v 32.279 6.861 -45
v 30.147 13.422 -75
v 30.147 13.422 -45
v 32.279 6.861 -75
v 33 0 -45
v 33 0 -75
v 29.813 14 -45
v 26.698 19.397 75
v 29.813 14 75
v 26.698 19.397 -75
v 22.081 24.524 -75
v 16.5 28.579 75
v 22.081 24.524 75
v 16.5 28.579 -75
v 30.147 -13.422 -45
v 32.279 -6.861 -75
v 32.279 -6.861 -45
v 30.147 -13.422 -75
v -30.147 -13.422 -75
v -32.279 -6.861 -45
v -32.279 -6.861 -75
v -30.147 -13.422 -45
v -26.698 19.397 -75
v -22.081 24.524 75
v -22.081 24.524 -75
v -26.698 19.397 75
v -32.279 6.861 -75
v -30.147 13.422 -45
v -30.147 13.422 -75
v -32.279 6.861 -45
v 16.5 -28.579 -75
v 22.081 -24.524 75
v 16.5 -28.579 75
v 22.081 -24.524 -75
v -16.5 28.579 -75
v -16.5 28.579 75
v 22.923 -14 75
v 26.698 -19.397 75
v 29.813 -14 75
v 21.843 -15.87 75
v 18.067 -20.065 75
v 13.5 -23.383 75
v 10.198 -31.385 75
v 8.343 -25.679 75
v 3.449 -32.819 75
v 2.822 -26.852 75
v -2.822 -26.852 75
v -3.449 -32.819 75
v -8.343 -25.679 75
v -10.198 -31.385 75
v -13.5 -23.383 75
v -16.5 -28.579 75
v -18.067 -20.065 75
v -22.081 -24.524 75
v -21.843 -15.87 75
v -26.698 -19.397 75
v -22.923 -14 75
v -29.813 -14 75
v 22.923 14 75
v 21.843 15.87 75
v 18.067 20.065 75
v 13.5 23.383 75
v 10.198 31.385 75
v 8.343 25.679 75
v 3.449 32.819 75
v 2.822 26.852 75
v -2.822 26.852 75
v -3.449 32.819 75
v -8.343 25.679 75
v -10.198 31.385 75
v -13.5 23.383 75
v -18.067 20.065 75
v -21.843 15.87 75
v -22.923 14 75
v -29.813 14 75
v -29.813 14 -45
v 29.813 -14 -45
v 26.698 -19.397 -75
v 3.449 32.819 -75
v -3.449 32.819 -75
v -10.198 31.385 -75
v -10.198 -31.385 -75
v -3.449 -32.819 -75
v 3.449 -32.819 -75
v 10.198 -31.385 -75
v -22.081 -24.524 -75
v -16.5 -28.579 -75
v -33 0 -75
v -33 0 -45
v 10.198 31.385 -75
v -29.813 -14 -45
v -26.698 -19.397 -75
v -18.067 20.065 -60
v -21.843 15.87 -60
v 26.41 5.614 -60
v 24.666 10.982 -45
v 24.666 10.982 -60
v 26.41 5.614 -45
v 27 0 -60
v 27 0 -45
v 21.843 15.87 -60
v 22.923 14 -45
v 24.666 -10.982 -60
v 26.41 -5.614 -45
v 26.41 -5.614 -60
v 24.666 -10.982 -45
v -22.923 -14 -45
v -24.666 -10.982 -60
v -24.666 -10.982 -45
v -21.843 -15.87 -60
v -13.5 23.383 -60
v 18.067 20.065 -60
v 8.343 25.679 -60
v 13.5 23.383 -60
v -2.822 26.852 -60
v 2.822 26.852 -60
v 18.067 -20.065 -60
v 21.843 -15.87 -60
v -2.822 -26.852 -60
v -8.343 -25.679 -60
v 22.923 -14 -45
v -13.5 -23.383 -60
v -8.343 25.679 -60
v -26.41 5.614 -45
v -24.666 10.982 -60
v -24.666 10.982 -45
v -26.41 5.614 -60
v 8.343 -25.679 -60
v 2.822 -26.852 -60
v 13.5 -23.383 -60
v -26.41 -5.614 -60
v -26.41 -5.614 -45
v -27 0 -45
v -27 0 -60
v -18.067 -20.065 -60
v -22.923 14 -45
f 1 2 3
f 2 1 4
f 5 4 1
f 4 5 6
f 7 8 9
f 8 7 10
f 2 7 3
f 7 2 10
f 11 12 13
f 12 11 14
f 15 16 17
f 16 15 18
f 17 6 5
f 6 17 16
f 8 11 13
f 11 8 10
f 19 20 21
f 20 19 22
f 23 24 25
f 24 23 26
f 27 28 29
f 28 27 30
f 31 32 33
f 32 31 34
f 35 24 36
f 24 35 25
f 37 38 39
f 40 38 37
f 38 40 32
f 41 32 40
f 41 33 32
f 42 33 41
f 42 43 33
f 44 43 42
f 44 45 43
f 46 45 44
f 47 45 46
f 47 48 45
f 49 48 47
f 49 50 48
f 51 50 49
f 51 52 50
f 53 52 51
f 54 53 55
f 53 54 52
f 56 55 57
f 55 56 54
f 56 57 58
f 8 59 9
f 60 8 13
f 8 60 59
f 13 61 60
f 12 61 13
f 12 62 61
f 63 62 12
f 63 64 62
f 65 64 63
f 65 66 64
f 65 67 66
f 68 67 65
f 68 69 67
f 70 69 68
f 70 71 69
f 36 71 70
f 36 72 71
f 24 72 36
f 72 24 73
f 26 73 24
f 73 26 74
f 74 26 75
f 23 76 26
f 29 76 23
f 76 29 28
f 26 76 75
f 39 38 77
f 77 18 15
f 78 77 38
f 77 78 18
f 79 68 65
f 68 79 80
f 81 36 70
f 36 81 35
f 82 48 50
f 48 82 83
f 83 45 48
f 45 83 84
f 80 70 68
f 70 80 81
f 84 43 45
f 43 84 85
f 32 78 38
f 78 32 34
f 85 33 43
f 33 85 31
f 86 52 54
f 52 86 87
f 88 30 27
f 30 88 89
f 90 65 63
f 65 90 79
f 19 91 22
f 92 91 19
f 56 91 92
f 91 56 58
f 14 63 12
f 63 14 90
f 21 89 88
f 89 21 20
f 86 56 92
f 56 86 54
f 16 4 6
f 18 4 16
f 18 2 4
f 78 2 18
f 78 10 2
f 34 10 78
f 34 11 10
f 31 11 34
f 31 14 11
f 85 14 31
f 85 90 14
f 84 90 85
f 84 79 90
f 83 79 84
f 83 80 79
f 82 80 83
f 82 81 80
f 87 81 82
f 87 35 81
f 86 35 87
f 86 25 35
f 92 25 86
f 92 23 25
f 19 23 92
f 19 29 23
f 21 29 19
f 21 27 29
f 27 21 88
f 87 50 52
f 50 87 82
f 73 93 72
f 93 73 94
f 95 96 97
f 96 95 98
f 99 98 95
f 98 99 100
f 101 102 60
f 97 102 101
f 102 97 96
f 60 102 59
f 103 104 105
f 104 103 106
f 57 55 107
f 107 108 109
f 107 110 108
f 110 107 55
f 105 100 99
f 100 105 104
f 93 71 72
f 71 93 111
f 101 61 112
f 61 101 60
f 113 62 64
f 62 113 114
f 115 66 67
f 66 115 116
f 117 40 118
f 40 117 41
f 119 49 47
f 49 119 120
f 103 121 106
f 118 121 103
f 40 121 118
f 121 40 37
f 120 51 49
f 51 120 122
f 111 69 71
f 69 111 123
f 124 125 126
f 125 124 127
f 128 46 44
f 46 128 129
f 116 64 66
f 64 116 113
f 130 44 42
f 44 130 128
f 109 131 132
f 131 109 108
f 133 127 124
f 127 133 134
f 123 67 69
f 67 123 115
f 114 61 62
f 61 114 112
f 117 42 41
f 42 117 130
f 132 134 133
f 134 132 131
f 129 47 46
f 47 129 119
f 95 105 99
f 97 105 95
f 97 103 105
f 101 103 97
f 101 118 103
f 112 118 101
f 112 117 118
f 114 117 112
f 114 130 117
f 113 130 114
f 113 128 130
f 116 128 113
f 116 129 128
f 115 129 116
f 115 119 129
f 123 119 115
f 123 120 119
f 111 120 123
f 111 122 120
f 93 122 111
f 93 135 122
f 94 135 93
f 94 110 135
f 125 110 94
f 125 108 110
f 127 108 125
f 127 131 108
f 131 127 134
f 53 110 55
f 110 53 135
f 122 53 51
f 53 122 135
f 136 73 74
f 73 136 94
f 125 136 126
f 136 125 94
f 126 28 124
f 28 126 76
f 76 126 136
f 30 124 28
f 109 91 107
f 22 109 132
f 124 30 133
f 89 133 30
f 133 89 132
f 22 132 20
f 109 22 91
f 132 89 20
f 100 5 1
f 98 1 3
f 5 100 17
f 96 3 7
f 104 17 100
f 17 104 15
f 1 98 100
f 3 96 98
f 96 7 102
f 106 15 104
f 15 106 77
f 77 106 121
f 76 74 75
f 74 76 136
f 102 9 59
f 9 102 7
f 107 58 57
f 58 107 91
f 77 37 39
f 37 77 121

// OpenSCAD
//Turbidostat
//Chamber
//Bottom Part
//by: Agostino Guarino agostinoguarino@gmail.com


//Dimensions of the Test Tube, in mm
ttube_ext_diam=25; 
ttube_height=150;

//Structure Dimensions
tube_tolerance=2; //gap between the tube and the holder
support_ext_diam=ttube_ext_diam+8;
base_thickness=15;
hole_base=14;
hole_height=60;

difference(){
    difference(){
        cylinder(h = ttube_height, r1 = support_ext_diam, r2 = support_ext_diam, center = true);
        translate([0, 0, base_thickness]){
            cylinder(h = ttube_height, r1 = ttube_ext_diam+tube_tolerance,     r2 = ttube_ext_diam+tube_tolerance, center = true);
            }
    }
    translate([0,0,15])cube([support_ext_diam*2,hole_base*2,hole_height*2],true);
}
